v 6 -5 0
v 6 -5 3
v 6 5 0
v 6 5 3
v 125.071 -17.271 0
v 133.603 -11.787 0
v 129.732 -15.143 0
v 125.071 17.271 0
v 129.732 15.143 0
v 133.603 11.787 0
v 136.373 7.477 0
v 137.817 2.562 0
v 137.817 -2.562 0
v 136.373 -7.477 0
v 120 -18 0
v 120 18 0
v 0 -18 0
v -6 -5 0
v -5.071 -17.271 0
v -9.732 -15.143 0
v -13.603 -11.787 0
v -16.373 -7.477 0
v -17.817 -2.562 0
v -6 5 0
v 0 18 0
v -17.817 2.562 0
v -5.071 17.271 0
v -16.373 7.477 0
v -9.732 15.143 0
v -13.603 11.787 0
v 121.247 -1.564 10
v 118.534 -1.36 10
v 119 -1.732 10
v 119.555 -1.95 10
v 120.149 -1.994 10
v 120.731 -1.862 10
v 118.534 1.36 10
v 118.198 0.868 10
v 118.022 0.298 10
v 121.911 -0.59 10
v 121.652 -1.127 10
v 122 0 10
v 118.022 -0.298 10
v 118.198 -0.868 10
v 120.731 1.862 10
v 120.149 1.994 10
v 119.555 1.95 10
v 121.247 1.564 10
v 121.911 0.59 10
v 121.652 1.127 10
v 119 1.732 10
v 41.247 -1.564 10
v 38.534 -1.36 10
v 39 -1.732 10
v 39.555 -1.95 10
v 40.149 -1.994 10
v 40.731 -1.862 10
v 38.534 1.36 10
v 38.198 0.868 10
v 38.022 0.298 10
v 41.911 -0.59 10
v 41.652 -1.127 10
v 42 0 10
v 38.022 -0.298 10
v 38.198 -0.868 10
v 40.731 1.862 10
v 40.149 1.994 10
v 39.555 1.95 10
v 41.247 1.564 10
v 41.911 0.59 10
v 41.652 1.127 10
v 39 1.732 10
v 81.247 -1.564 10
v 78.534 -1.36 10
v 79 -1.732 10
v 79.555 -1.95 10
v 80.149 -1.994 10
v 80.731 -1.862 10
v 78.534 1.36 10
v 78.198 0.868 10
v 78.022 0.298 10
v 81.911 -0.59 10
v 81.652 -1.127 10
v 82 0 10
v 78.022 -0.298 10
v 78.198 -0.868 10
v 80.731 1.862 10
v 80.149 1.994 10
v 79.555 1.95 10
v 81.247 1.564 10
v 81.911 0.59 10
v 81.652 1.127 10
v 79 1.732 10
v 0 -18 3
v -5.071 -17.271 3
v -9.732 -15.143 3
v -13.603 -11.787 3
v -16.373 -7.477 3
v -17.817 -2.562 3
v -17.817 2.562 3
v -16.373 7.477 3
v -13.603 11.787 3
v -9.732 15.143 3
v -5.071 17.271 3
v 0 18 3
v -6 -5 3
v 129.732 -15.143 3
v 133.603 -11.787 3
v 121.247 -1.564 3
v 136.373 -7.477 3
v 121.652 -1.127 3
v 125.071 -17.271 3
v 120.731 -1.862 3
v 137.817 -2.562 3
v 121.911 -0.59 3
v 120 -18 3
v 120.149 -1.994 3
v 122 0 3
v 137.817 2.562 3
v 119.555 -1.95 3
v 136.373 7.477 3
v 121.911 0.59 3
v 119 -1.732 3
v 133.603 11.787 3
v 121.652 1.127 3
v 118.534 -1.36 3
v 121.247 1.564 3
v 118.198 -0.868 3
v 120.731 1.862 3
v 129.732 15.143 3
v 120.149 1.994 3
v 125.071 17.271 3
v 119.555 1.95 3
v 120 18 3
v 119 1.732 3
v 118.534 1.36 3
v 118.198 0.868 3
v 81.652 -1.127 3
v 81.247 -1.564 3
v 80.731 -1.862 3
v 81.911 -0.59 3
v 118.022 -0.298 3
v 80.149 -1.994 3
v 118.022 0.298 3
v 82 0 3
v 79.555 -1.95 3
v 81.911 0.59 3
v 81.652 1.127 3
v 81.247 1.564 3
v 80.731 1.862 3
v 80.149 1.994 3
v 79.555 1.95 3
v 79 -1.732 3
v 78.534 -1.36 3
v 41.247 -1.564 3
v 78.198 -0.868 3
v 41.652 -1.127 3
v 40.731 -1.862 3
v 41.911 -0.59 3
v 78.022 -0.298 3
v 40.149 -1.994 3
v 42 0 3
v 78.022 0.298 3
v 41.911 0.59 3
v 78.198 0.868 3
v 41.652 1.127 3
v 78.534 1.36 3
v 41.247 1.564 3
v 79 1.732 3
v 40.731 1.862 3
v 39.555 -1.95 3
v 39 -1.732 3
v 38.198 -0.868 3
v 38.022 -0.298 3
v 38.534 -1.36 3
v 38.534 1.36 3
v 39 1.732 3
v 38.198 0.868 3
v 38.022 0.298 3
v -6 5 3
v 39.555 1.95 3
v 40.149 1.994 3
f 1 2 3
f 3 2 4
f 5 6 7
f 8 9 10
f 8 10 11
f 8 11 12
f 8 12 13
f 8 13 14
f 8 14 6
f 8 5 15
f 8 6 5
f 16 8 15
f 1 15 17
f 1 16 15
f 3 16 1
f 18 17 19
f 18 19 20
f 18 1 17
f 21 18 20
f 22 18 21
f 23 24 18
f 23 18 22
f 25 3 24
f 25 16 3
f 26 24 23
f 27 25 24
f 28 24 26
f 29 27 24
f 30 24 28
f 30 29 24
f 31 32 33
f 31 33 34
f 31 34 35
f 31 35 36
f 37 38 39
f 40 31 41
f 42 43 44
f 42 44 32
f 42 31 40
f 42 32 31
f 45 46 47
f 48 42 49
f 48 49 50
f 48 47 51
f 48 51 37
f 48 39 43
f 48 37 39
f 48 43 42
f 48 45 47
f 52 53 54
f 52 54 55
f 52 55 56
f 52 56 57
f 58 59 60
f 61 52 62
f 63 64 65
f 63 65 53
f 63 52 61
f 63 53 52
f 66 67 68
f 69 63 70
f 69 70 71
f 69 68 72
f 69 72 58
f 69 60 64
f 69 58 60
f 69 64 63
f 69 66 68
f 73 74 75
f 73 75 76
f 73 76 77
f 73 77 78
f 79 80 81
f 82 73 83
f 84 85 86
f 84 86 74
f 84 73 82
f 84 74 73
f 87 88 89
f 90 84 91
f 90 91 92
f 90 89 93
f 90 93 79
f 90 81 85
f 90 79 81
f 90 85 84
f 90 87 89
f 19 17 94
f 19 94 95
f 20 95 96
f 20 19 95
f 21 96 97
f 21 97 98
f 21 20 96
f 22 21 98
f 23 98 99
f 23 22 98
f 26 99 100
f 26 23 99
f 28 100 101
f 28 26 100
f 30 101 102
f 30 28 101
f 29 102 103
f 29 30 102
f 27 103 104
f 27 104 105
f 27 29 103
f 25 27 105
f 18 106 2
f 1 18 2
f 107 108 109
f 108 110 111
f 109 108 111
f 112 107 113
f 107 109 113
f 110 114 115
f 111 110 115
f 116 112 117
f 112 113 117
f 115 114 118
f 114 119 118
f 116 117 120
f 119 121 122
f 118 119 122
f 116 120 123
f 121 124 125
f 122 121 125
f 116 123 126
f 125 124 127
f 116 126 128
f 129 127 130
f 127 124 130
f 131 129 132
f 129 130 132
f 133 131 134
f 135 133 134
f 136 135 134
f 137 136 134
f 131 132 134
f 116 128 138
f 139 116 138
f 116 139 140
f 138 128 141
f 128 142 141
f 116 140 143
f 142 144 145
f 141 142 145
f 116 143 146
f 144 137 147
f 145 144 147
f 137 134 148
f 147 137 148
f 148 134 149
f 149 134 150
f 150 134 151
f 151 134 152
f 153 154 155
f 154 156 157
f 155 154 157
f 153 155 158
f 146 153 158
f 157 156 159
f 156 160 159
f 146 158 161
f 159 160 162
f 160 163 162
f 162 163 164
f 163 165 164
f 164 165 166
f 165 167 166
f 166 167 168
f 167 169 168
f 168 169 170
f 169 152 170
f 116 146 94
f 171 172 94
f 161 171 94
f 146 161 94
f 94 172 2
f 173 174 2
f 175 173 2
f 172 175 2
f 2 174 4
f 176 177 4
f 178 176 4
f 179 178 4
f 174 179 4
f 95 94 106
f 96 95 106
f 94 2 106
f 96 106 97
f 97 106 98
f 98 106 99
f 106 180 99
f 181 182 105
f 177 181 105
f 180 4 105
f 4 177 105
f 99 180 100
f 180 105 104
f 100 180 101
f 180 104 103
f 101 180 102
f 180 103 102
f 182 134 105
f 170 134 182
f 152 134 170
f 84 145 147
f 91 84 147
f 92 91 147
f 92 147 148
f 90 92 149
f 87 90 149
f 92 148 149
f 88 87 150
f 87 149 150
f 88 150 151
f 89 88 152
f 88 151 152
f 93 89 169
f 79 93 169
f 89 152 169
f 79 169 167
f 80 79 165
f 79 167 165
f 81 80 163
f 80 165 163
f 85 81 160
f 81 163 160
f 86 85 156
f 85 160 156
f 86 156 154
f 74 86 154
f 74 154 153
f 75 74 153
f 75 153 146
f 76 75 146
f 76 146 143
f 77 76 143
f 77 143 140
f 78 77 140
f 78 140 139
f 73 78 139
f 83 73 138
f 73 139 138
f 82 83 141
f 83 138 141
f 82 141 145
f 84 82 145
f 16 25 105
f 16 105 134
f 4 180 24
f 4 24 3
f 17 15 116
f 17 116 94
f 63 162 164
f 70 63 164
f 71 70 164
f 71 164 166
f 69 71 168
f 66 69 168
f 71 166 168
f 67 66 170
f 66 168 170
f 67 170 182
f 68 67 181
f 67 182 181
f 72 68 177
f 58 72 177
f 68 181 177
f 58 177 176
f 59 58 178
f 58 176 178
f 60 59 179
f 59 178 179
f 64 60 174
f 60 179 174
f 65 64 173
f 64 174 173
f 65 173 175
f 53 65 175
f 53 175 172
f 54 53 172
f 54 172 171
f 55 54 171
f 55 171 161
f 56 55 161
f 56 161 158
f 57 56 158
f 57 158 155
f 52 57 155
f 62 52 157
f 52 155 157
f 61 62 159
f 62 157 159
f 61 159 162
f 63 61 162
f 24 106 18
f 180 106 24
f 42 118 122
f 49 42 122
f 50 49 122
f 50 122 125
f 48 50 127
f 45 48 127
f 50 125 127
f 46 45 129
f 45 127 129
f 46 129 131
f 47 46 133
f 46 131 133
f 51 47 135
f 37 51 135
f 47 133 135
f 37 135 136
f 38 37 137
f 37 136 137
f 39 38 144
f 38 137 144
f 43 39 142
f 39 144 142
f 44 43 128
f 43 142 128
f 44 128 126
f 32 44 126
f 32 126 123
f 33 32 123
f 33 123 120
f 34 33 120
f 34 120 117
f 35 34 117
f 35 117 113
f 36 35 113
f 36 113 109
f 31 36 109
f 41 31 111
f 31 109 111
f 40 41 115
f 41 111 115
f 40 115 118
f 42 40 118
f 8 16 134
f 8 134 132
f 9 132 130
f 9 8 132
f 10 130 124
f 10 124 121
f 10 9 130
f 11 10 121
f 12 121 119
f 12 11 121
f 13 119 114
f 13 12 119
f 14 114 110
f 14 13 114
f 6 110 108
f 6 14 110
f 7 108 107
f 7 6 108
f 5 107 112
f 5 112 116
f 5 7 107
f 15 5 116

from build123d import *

# Parameters (mm, degrees)
BOSS_EXTRUDE1_DEPTH = 3
SKETCH3_W           = 12
SKETCH3_H           = 10
CUT_EXTRUDE1_DEPTH  = 3
SKETCH5_R           = 2
BOSS_EXTRUDE2_DEPTH = 7
LPATTERN1_COUNT     = 4
LPATTERN1_PITCH     = 40


with BuildPart() as part:
    # Sketch2 → Boss-Extrude1 (new body)
    with BuildSketch(Plane.XY):
        with BuildLine():
            Line((0, 18), (120, 18))
            ThreePointArc((120, 18), (138, 0), (120, -18))
            Line((120, -18), (0, -18))
            ThreePointArc((0, -18), (-18, 0), (0, 18))
        make_face()
    extrude(amount=BOSS_EXTRUDE1_DEPTH)

    # Sketch3 → Cut-Extrude1 (cut)
    with BuildSketch(Plane.XY.offset(3)):
        Rectangle(SKETCH3_W, SKETCH3_H)
    extrude(amount=-CUT_EXTRUDE1_DEPTH, mode=Mode.SUBTRACT)

    # Sketch5 → Boss-Extrude2 (add)
    with BuildSketch(Plane.XY.offset(3)):
        with Locations((120, 0)):
            Circle(SKETCH5_R)
    boss_extrude2 = extrude(amount=BOSS_EXTRUDE2_DEPTH)

    # LPattern1: Boss-Extrude2 ×4, 1 skipped
    with Locations(*[(-i * LPATTERN1_PITCH, 0, 0) for i in range(1, LPATTERN1_COUNT) if i not in (3,)]):
        add(boss_extrude2)


solid = part.part
